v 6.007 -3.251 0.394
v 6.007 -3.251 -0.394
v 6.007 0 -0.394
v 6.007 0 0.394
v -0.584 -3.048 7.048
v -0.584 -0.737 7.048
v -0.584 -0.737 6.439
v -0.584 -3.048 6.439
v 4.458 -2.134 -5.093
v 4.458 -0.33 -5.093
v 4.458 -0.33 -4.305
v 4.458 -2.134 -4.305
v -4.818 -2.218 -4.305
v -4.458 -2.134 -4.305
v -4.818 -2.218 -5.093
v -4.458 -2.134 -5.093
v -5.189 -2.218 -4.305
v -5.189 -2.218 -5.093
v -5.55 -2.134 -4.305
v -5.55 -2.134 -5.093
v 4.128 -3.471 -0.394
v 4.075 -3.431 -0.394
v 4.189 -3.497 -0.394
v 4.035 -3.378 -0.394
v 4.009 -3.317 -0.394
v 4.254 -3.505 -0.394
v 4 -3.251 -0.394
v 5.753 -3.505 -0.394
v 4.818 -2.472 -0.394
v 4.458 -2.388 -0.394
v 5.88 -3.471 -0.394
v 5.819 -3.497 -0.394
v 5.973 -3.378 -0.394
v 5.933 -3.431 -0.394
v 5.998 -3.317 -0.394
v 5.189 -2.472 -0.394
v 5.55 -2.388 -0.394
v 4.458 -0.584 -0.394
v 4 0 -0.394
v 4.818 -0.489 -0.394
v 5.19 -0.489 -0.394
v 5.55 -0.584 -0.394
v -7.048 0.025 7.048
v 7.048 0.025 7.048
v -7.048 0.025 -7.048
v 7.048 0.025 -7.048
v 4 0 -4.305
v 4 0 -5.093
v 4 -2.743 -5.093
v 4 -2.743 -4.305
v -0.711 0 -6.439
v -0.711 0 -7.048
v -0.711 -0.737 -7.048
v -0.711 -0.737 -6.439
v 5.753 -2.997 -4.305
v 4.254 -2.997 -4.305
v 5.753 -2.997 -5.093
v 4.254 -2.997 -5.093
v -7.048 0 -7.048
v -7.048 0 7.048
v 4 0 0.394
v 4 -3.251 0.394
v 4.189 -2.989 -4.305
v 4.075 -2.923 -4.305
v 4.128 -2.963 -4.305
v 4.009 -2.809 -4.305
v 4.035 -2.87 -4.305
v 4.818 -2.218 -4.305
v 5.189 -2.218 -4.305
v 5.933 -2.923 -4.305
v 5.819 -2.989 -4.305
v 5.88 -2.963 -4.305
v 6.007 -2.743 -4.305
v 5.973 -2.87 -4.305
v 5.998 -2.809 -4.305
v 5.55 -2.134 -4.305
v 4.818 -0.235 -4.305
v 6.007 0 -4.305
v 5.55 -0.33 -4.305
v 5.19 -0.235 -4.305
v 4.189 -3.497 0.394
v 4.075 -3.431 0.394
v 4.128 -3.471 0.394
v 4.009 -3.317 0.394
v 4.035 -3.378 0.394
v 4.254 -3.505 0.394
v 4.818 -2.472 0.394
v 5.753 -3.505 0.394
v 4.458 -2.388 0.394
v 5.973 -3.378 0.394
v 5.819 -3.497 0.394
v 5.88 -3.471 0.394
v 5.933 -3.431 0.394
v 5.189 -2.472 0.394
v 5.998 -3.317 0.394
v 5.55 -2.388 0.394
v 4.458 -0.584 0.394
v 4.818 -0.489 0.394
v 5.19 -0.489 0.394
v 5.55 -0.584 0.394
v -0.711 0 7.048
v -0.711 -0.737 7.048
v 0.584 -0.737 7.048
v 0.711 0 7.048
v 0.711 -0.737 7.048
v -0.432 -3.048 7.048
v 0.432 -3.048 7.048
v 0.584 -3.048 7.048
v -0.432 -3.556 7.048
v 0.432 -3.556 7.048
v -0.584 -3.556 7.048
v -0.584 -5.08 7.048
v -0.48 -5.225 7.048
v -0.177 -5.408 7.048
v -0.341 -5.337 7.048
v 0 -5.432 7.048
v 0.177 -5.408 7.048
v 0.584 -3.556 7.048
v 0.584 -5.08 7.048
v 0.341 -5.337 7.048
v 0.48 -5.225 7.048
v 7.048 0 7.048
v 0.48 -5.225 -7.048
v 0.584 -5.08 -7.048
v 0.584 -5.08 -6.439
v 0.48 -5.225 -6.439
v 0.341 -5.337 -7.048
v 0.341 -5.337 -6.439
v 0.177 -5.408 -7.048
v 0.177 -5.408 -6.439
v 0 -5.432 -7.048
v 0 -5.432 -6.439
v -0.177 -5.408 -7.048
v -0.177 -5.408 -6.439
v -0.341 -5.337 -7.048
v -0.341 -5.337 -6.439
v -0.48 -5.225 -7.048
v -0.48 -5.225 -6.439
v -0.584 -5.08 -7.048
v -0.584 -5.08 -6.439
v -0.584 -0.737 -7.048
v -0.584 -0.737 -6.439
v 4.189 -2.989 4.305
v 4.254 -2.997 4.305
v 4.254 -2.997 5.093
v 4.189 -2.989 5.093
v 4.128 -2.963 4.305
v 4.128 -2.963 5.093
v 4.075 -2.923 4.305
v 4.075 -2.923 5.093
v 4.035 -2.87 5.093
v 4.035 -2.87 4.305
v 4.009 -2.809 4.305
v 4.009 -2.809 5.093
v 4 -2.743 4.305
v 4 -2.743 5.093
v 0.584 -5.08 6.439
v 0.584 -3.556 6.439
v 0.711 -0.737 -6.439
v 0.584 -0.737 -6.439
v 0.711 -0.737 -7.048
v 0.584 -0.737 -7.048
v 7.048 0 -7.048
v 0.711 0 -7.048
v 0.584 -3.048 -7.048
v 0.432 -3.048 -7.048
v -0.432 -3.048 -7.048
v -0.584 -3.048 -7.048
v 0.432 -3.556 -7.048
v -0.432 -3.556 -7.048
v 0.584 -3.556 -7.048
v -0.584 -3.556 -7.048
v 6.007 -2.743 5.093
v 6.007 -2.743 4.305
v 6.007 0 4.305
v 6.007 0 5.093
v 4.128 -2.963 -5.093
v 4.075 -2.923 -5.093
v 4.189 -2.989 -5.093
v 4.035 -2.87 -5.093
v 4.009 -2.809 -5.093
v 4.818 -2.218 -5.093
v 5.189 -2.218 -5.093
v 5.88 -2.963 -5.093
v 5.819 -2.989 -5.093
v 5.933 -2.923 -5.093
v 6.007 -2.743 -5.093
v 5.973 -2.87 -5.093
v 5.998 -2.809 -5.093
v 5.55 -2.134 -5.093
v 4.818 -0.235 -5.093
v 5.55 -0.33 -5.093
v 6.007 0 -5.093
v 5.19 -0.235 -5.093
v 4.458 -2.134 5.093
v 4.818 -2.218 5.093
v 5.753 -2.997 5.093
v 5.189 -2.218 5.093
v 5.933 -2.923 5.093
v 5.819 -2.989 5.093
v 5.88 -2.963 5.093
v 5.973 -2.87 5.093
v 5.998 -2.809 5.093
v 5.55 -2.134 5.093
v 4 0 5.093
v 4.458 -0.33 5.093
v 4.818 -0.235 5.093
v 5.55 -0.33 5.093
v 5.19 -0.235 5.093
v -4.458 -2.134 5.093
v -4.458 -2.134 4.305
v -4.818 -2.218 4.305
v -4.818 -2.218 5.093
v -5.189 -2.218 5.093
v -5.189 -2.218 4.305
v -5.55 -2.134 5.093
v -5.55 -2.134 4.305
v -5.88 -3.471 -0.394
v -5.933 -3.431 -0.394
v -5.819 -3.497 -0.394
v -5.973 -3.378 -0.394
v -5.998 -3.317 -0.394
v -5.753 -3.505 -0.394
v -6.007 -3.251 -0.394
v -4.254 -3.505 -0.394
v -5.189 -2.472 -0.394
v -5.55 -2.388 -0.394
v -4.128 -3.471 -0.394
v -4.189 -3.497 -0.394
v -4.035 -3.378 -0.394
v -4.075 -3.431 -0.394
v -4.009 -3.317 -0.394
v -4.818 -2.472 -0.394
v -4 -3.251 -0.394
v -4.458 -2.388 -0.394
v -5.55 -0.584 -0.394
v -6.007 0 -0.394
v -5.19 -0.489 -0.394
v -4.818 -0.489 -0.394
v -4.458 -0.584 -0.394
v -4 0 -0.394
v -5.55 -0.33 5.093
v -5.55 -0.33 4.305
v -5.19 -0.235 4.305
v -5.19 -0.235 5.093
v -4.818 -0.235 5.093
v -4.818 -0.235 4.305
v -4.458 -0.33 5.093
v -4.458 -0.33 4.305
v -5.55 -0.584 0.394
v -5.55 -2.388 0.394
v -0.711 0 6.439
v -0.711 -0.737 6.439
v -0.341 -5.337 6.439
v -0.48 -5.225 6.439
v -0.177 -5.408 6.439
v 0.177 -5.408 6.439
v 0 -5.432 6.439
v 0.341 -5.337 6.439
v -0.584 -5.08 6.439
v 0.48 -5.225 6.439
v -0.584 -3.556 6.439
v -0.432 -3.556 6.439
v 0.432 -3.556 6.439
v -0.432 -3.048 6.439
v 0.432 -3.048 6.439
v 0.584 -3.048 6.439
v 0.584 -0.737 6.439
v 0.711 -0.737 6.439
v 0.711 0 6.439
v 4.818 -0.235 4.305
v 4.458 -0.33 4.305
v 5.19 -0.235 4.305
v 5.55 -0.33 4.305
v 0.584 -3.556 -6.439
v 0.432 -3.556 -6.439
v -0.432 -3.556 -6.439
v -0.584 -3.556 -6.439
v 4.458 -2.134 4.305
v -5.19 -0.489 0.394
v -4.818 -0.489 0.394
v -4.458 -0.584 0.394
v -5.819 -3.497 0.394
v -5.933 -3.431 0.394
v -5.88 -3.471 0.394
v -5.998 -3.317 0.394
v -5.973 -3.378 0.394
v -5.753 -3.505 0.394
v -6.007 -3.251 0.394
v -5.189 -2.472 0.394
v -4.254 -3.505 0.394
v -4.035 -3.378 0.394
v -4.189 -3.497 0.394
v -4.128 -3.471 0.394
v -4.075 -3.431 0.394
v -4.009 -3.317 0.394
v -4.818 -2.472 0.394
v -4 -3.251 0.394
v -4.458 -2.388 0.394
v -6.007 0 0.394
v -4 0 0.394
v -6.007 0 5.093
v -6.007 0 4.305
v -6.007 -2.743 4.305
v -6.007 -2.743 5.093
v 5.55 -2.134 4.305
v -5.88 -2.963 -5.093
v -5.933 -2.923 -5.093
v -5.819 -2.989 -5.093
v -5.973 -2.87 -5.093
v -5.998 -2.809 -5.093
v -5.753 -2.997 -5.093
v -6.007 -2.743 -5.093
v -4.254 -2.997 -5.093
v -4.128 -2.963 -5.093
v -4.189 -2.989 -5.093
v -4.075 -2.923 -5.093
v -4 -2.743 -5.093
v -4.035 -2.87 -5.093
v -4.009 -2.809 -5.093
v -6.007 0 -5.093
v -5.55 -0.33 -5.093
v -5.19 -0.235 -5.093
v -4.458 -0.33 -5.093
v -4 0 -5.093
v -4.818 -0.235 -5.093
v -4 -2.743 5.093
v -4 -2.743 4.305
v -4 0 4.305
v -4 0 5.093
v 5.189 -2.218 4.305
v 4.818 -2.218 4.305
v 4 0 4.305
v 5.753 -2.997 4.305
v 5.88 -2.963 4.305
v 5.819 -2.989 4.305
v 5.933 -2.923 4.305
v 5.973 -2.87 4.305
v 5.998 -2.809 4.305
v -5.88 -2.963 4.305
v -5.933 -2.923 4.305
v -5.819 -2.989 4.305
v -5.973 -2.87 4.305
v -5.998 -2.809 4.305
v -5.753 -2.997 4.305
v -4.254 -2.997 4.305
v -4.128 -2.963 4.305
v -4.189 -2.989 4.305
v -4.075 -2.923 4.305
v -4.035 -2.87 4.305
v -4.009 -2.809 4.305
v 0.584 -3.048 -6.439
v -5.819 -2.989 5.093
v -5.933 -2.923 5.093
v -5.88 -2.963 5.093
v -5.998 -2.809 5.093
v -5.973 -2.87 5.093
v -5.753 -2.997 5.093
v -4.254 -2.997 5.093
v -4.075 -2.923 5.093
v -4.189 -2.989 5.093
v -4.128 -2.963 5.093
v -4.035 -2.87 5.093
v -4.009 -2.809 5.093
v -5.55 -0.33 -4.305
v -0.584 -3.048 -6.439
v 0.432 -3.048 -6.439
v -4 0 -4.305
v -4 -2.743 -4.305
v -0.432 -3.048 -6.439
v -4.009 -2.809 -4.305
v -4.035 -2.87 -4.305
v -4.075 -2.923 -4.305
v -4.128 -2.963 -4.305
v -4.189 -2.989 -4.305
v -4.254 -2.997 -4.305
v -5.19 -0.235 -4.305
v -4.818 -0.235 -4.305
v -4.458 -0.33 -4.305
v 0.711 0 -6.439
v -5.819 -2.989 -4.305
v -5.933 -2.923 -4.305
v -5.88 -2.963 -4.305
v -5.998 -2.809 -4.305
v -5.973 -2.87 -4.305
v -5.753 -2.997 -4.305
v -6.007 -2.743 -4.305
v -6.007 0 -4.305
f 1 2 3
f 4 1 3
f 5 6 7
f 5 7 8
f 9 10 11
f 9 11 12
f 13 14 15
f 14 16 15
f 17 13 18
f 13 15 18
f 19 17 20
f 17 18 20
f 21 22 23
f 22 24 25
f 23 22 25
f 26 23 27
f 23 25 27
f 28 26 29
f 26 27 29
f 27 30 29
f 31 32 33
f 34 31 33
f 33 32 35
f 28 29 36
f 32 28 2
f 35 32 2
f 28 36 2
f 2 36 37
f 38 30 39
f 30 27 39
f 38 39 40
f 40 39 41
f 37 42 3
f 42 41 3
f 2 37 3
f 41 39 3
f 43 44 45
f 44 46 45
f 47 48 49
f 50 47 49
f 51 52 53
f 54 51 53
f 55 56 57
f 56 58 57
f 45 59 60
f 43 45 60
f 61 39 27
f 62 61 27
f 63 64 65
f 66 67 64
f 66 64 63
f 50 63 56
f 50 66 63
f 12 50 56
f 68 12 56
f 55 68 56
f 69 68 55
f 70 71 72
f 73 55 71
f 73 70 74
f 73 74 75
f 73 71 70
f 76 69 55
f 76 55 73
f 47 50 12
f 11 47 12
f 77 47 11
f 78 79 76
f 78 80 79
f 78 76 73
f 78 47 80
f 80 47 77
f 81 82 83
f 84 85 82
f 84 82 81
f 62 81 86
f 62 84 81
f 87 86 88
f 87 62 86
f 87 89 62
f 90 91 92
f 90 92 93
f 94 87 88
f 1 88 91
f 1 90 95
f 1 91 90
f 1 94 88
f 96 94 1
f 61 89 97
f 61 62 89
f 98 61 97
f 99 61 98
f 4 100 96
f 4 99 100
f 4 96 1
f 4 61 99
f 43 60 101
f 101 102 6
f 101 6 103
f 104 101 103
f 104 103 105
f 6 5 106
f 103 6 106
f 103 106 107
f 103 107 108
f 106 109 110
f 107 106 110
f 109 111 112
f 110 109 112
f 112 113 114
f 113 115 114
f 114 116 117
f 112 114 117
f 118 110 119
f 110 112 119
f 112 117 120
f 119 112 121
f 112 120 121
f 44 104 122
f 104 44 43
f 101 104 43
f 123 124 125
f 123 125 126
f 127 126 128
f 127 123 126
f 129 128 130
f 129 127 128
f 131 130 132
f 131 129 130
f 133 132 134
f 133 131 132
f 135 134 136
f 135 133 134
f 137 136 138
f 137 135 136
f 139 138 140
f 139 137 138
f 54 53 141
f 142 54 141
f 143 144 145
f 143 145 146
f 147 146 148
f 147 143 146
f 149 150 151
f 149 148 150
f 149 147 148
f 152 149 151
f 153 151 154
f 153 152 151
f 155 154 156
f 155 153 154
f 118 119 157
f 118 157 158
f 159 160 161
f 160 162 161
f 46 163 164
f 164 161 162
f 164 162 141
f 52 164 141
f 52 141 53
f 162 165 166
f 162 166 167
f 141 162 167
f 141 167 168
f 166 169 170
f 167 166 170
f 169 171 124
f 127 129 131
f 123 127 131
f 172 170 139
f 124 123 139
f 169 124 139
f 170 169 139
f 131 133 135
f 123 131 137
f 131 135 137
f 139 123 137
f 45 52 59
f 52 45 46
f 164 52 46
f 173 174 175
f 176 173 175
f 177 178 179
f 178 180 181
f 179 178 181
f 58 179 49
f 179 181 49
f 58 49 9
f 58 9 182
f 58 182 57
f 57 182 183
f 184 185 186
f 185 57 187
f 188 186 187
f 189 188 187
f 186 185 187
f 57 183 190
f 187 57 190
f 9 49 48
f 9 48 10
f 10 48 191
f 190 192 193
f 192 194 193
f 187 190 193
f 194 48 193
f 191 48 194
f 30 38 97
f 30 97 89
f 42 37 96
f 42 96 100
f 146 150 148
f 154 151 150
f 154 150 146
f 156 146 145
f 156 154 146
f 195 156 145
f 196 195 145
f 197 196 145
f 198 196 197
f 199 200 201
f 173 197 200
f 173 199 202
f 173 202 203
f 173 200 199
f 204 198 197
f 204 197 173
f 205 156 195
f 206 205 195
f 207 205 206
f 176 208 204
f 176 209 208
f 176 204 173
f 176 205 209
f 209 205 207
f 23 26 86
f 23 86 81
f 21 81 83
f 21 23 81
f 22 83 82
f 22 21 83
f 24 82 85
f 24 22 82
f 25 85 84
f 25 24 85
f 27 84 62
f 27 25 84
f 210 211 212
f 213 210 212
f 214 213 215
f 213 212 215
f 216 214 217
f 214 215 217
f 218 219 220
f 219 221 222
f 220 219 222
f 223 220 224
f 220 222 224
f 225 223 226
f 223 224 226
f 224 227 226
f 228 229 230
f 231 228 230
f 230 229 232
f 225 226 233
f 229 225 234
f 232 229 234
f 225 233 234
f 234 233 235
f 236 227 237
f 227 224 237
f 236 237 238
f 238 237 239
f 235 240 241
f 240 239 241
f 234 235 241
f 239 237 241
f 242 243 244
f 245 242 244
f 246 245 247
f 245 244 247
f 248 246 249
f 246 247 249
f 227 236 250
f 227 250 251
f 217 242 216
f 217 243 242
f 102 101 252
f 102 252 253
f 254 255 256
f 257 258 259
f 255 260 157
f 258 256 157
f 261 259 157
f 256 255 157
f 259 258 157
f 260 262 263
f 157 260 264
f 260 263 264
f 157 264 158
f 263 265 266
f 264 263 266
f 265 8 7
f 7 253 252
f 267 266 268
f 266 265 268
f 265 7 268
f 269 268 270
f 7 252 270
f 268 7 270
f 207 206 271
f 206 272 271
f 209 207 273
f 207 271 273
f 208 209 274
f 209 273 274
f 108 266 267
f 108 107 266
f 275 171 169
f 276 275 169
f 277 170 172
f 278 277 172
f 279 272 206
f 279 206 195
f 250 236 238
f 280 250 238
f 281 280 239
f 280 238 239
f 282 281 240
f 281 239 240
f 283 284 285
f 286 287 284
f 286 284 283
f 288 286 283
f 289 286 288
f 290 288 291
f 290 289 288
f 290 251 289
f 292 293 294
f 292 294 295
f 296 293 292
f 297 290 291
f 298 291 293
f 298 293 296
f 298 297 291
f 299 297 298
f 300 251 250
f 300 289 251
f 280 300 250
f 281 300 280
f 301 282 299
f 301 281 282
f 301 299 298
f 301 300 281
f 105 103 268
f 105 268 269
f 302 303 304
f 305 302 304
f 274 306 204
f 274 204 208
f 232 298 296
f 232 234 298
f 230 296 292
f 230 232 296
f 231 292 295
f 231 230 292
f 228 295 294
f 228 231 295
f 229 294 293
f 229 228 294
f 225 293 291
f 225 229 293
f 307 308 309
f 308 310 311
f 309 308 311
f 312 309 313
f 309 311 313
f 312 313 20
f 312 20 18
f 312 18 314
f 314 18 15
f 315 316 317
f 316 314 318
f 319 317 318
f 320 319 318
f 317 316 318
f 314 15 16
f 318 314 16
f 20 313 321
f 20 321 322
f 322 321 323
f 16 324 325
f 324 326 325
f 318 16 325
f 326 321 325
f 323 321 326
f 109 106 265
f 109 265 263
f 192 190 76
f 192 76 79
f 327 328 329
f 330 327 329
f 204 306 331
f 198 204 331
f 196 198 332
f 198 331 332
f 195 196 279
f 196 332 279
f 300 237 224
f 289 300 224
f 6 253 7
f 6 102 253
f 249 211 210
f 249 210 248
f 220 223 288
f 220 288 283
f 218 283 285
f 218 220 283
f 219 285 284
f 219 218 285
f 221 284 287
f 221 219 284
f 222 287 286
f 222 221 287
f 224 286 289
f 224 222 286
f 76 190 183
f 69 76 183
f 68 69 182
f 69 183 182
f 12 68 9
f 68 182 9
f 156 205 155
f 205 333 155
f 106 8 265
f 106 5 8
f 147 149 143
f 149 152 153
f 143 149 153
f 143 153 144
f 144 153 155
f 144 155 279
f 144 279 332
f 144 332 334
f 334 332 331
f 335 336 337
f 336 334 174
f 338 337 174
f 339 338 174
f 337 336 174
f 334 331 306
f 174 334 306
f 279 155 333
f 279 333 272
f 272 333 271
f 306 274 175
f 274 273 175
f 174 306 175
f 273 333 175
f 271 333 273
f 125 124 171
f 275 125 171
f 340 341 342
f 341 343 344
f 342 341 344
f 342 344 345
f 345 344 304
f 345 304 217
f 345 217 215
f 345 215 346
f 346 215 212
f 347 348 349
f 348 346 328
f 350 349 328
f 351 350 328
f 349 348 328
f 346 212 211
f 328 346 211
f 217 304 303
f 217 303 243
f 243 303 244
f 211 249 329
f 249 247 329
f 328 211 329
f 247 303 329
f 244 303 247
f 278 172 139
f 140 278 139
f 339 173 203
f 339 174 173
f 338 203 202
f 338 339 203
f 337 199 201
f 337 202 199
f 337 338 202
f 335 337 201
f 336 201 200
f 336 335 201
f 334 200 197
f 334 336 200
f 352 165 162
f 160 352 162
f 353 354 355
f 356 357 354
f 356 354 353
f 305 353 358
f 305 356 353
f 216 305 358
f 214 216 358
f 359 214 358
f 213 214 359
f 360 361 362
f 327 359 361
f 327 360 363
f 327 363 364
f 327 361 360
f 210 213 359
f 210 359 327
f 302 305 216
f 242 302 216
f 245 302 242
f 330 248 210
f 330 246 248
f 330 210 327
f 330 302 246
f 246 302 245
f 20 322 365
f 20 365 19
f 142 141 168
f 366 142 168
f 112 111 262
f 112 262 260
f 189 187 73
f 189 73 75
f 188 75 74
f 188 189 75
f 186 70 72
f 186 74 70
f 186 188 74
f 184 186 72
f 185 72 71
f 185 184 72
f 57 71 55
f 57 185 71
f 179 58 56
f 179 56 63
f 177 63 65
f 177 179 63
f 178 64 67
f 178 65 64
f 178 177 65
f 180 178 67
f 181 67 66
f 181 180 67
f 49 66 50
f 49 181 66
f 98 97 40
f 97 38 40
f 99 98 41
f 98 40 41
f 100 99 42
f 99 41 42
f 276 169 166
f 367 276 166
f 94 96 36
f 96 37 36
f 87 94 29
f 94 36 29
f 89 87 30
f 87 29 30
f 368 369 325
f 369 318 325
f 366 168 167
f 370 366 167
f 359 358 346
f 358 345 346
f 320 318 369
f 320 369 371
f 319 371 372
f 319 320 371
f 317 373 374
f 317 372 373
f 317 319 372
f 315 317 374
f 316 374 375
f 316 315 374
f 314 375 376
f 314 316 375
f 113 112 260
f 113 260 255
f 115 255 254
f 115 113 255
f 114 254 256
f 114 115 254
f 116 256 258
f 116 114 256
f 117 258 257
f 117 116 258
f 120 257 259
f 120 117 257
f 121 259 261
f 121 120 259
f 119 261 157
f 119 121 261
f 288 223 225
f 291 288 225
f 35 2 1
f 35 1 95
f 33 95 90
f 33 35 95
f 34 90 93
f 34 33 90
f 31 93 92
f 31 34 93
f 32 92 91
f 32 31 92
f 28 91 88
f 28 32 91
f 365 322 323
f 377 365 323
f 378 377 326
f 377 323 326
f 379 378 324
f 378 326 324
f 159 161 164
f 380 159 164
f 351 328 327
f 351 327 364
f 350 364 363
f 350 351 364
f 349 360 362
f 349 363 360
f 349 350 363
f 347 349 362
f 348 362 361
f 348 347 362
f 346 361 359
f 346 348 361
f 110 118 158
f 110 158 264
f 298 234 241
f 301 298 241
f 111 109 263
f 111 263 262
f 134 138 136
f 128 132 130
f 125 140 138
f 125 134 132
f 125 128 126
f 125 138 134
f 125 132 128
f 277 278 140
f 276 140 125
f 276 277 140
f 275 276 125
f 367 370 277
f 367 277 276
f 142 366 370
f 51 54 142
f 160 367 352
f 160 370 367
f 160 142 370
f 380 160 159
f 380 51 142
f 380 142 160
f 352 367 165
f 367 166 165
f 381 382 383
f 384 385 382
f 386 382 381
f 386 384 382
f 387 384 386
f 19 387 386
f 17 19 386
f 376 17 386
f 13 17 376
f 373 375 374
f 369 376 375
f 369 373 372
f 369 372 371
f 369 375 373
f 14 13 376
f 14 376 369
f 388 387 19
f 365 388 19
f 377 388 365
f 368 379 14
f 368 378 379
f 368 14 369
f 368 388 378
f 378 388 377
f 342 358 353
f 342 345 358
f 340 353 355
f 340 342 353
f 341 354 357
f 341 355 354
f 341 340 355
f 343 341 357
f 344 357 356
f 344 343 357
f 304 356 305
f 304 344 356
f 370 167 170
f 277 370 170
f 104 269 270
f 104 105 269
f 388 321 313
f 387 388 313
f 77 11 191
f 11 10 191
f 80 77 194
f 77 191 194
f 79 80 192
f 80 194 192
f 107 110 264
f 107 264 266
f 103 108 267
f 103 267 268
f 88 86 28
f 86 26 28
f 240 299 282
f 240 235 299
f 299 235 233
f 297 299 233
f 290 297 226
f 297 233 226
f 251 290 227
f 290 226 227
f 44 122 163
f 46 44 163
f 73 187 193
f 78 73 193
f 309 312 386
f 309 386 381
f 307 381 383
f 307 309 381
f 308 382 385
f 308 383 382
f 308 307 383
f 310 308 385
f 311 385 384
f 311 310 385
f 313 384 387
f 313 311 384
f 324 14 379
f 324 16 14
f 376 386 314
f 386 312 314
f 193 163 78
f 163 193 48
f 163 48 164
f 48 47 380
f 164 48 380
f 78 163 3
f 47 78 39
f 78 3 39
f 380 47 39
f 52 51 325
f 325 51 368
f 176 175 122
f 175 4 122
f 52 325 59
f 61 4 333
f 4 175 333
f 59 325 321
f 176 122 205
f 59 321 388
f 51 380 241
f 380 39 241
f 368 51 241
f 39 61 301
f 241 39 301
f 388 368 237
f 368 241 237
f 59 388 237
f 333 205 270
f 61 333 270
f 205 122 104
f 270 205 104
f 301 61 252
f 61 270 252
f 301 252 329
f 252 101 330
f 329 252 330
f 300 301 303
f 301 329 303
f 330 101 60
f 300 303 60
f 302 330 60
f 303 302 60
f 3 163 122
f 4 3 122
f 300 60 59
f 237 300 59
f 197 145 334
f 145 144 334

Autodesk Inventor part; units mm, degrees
sketch "Sketch_1" plane through (0, 0, 0) normal (0, 1, 0) x (-1, 0, 0)
  line L0 (7.0485, -7.0485) -> (7.0485, 7.0485)
  line L1 (7.0485, 7.0485) -> (-7.0485, 7.0485)
  line L2 (-7.0485, 7.0485) -> (-7.0485, -7.0485)
  line L3 (-7.0485, -7.0485) -> (7.0485, -7.0485)
extrude "Extrusion1" add sketch "Sketch_1" along normal blind 0.0254
sketch "Sketch_3" plane through (0, 0, 7.0485) normal (0, 0, 1) x (1, 0, 0)
  line L0 (-0.7112, 0.0254) -> (-0.7112, -0.7366)
  line L1 (-0.7112, -0.7366) -> (-0.5842, -0.7366)
  line L2 (-0.5842, -0.7366) -> (-0.5842, -3.048)
  line L3 (-0.5842, -3.048) -> (-0.4318, -3.048)
  line L4 (-0.4318, -3.048) -> (-0.4318, -3.556)
  line L5 (-0.4318, -3.556) -> (-0.5842, -3.556)
  line L6 (-0.5842, -3.556) -> (-0.5842, -5.08)
  arc A0 (-0.5842, -5.08) -> (0.5842, -5.08) centre (0, -4.772) ccw
  line L7 (0.5842, -5.08) -> (0.5842, -3.556)
  line L8 (0.5842, -3.556) -> (0.4318, -3.556)
  line L9 (0.4318, -3.556) -> (0.4318, -3.048)
  line L10 (0.4318, -3.048) -> (0.5842, -3.048)
  line L11 (0.5842, -3.048) -> (0.5842, -0.7366)
  line L12 (0.5842, -0.7366) -> (0.7112, -0.7366)
  line L13 (0.7112, -0.7366) -> (0.7112, 0.0254)
  line L14 (0.7112, 0.0254) -> (-0.7112, 0.0254)
extrude "Extrusion2" add sketch "Sketch_3" against normal blind 0.6096
sketch "Sketch_5" plane through (0, 0, 0) normal (0, 0, 1) x (1, 0, 0)
  line L0 (4.0005, 0.0254) -> (4.0005, -3.2512)
  arc A0 (4.0005, -3.2512) -> (4.2545, -3.5052) centre (4.2545, -3.2512) ccw
  line L1 (4.2545, -3.5052) -> (5.7531, -3.5052)
  arc A1 (5.7531, -3.5052) -> (6.0071, -3.2512) centre (5.7531, -3.2512) ccw
  line L2 (6.0071, -3.2512) -> (6.0071, 0.0254)
  line L3 (6.0071, 0.0254) -> (4.0005, 0.0254)
  arc A2 (4.4577, -2.3876) -> (5.5499, -2.3876) centre (5.0038, -0.8728) ccw
  line L4 (5.5499, -2.3876) -> (5.5499, -0.5842)
  arc A3 (5.5499, -0.5842) -> (4.4577, -0.5842) centre (5.0038, -1.9147) ccw
  line L5 (4.4577, -0.5842) -> (4.4577, -2.3876)
extrude "Extrusion3" add sketch "Sketch_5" along normal mid plane 0.7874
sketch "Sketch_6" plane through (0, 0, 0) normal (0, 0, 1) x (1, 0, 0)
  line L0 (-6.0071, 0.0254) -> (-6.0071, -3.2512)
  arc A0 (-6.0071, -3.2512) -> (-5.7531, -3.5052) centre (-5.7531, -3.2512) ccw
  line L1 (-5.7531, -3.5052) -> (-4.2545, -3.5052)
  arc A1 (-4.2545, -3.5052) -> (-4.0005, -3.2512) centre (-4.2545, -3.2512) ccw
  line L2 (-4.0005, -3.2512) -> (-4.0005, 0.0254)
  line L3 (-4.0005, 0.0254) -> (-6.0071, 0.0254)
  line L4 (-5.5499, -0.5842) -> (-5.5499, -2.3876)
  arc A2 (-5.5499, -2.3876) -> (-4.4577, -2.3876) centre (-5.0038, -0.8728) ccw
  line L5 (-4.4577, -2.3876) -> (-4.4577, -0.5842)
  arc A3 (-4.4577, -0.5842) -> (-5.5499, -0.5842) centre (-5.0038, -1.9147) ccw
extrude "Extrusion4" add sketch "Sketch_6" along normal mid plane 0.7874
sketch "Sketch_7" plane through (0, 0, -4.699) normal (0, 0, 1) x (1, 0, 0)
  line L0 (4.0005, 0.0254) -> (4.0005, -2.7432)
  arc A0 (4.0005, -2.7432) -> (4.2545, -2.9972) centre (4.2545, -2.7432) ccw
  line L1 (4.2545, -2.9972) -> (5.7531, -2.9972)
  arc A1 (5.7531, -2.9972) -> (6.0071, -2.7432) centre (5.7531, -2.7432) ccw
  line L2 (6.0071, -2.7432) -> (6.0071, 0.0254)
  line L3 (6.0071, 0.0254) -> (4.0005, 0.0254)
  arc A2 (4.4577, -2.1336) -> (5.5499, -2.1336) centre (5.0038, -0.6188) ccw
  line L4 (5.5499, -2.1336) -> (5.5499, -0.3302)
  arc A3 (5.5499, -0.3302) -> (4.4577, -0.3302) centre (5.0038, -1.6607) ccw
  line L5 (4.4577, -0.3302) -> (4.4577, -2.1336)
extrude "Extrusion5" add sketch "Sketch_7" along normal mid plane 0.7874
sketch "Sketch_8" plane through (0, 0, -4.699) normal (0, 0, 1) x (1, 0, 0)
  line L0 (-6.0071, 0.0254) -> (-6.0071, -2.7432)
  arc A0 (-6.0071, -2.7432) -> (-5.7531, -2.9972) centre (-5.7531, -2.7432) ccw
  line L1 (-5.7531, -2.9972) -> (-4.2545, -2.9972)
  arc A1 (-4.2545, -2.9972) -> (-4.0005, -2.7432) centre (-4.2545, -2.7432) ccw
  line L2 (-4.0005, -2.7432) -> (-4.0005, 0.0254)
  line L3 (-4.0005, 0.0254) -> (-6.0071, 0.0254)
  line L4 (-5.5499, -0.3302) -> (-5.5499, -2.1336)
  arc A2 (-5.5499, -2.1336) -> (-4.4577, -2.1336) centre (-5.0038, -0.6188) ccw
  line L5 (-4.4577, -2.1336) -> (-4.4577, -0.3302)
  arc A3 (-4.4577, -0.3302) -> (-5.5499, -0.3302) centre (-5.0038, -1.6607) ccw
extrude "Extrusion6" add sketch "Sketch_8" along normal mid plane 0.7874
sketch "Sketch_9" plane through (0, 0, 4.699) normal (0, 0, 1) x (1, 0, 0)
  line L0 (4.0005, 0.0254) -> (4.0005, -2.7432)
  arc A0 (4.0005, -2.7432) -> (4.2545, -2.9972) centre (4.2545, -2.7432) ccw
  line L1 (4.2545, -2.9972) -> (5.7531, -2.9972)
  arc A1 (5.7531, -2.9972) -> (6.0071, -2.7432) centre (5.7531, -2.7432) ccw
  line L2 (6.0071, -2.7432) -> (6.0071, 0.0254)
  line L3 (6.0071, 0.0254) -> (4.0005, 0.0254)
  arc A2 (4.4577, -2.1336) -> (5.5499, -2.1336) centre (5.0038, -0.6188) ccw
  line L4 (5.5499, -2.1336) -> (5.5499, -0.3302)
  arc A3 (5.5499, -0.3302) -> (4.4577, -0.3302) centre (5.0038, -1.6607) ccw
  line L5 (4.4577, -0.3302) -> (4.4577, -2.1336)
extrude "Extrusion7" add sketch "Sketch_9" along normal mid plane 0.7874
sketch "Sketch_10" plane through (0, 0, 4.699) normal (0, 0, 1) x (1, 0, 0)
  line L0 (-6.0071, 0.0254) -> (-6.0071, -2.7432)
  arc A0 (-6.0071, -2.7432) -> (-5.7531, -2.9972) centre (-5.7531, -2.7432) ccw
  line L1 (-5.7531, -2.9972) -> (-4.2545, -2.9972)
  arc A1 (-4.2545, -2.9972) -> (-4.0005, -2.7432) centre (-4.2545, -2.7432) ccw
  line L2 (-4.0005, -2.7432) -> (-4.0005, 0.0254)
  line L3 (-4.0005, 0.0254) -> (-6.0071, 0.0254)
  line L4 (-5.5499, -0.3302) -> (-5.5499, -2.1336)
  arc A2 (-5.5499, -2.1336) -> (-4.4577, -2.1336) centre (-5.0038, -0.6188) ccw
  line L5 (-4.4577, -2.1336) -> (-4.4577, -0.3302)
  arc A3 (-4.4577, -0.3302) -> (-5.5499, -0.3302) centre (-5.0038, -1.6607) ccw
extrude "Extrusion8" add sketch "Sketch_10" along normal mid plane 0.7874
sketch "Sketch_4" plane through (0, 0, -7.0485) normal (0, 0, 1) x (1, 0, 0)
  line L0 (-0.7112, 0.0254) -> (-0.7112, -0.7366)
  line L1 (-0.7112, -0.7366) -> (-0.5842, -0.7366)
  line L2 (-0.5842, -0.7366) -> (-0.5842, -3.048)
  line L3 (-0.5842, -3.048) -> (-0.4318, -3.048)
  line L4 (-0.4318, -3.048) -> (-0.4318, -3.556)
  line L5 (-0.4318, -3.556) -> (-0.5842, -3.556)
  line L6 (-0.5842, -3.556) -> (-0.5842, -5.08)
  arc A0 (-0.5842, -5.08) -> (0.5842, -5.08) centre (0, -4.772) ccw
  line L7 (0.5842, -5.08) -> (0.5842, -3.556)
  line L8 (0.5842, -3.556) -> (0.4318, -3.556)
  line L9 (0.4318, -3.556) -> (0.4318, -3.048)
  line L10 (0.4318, -3.048) -> (0.5842, -3.048)
  line L11 (0.5842, -3.048) -> (0.5842, -0.7366)
  line L12 (0.5842, -0.7366) -> (0.7112, -0.7366)
  line L13 (0.7112, -0.7366) -> (0.7112, 0.0254)
  line L14 (0.7112, 0.0254) -> (-0.7112, 0.0254)
extrude "Extrusion9" add sketch "Sketch_4" along normal blind 0.6096
ref_plane "pins_to_body_XY" through (0, 0, 0) normal (0, -1, 0) x (1, 0, 0)
ref_plane "pins_to_body_YZ" through (0, 0, 0) normal (1, 0, 0) x (0, 0, 1)
ref_plane "pins_to_body_ZX" through (0, 0, 0) normal (0, 0, 1) x (0, -1, 0)
properties part number "tlD-pins"
